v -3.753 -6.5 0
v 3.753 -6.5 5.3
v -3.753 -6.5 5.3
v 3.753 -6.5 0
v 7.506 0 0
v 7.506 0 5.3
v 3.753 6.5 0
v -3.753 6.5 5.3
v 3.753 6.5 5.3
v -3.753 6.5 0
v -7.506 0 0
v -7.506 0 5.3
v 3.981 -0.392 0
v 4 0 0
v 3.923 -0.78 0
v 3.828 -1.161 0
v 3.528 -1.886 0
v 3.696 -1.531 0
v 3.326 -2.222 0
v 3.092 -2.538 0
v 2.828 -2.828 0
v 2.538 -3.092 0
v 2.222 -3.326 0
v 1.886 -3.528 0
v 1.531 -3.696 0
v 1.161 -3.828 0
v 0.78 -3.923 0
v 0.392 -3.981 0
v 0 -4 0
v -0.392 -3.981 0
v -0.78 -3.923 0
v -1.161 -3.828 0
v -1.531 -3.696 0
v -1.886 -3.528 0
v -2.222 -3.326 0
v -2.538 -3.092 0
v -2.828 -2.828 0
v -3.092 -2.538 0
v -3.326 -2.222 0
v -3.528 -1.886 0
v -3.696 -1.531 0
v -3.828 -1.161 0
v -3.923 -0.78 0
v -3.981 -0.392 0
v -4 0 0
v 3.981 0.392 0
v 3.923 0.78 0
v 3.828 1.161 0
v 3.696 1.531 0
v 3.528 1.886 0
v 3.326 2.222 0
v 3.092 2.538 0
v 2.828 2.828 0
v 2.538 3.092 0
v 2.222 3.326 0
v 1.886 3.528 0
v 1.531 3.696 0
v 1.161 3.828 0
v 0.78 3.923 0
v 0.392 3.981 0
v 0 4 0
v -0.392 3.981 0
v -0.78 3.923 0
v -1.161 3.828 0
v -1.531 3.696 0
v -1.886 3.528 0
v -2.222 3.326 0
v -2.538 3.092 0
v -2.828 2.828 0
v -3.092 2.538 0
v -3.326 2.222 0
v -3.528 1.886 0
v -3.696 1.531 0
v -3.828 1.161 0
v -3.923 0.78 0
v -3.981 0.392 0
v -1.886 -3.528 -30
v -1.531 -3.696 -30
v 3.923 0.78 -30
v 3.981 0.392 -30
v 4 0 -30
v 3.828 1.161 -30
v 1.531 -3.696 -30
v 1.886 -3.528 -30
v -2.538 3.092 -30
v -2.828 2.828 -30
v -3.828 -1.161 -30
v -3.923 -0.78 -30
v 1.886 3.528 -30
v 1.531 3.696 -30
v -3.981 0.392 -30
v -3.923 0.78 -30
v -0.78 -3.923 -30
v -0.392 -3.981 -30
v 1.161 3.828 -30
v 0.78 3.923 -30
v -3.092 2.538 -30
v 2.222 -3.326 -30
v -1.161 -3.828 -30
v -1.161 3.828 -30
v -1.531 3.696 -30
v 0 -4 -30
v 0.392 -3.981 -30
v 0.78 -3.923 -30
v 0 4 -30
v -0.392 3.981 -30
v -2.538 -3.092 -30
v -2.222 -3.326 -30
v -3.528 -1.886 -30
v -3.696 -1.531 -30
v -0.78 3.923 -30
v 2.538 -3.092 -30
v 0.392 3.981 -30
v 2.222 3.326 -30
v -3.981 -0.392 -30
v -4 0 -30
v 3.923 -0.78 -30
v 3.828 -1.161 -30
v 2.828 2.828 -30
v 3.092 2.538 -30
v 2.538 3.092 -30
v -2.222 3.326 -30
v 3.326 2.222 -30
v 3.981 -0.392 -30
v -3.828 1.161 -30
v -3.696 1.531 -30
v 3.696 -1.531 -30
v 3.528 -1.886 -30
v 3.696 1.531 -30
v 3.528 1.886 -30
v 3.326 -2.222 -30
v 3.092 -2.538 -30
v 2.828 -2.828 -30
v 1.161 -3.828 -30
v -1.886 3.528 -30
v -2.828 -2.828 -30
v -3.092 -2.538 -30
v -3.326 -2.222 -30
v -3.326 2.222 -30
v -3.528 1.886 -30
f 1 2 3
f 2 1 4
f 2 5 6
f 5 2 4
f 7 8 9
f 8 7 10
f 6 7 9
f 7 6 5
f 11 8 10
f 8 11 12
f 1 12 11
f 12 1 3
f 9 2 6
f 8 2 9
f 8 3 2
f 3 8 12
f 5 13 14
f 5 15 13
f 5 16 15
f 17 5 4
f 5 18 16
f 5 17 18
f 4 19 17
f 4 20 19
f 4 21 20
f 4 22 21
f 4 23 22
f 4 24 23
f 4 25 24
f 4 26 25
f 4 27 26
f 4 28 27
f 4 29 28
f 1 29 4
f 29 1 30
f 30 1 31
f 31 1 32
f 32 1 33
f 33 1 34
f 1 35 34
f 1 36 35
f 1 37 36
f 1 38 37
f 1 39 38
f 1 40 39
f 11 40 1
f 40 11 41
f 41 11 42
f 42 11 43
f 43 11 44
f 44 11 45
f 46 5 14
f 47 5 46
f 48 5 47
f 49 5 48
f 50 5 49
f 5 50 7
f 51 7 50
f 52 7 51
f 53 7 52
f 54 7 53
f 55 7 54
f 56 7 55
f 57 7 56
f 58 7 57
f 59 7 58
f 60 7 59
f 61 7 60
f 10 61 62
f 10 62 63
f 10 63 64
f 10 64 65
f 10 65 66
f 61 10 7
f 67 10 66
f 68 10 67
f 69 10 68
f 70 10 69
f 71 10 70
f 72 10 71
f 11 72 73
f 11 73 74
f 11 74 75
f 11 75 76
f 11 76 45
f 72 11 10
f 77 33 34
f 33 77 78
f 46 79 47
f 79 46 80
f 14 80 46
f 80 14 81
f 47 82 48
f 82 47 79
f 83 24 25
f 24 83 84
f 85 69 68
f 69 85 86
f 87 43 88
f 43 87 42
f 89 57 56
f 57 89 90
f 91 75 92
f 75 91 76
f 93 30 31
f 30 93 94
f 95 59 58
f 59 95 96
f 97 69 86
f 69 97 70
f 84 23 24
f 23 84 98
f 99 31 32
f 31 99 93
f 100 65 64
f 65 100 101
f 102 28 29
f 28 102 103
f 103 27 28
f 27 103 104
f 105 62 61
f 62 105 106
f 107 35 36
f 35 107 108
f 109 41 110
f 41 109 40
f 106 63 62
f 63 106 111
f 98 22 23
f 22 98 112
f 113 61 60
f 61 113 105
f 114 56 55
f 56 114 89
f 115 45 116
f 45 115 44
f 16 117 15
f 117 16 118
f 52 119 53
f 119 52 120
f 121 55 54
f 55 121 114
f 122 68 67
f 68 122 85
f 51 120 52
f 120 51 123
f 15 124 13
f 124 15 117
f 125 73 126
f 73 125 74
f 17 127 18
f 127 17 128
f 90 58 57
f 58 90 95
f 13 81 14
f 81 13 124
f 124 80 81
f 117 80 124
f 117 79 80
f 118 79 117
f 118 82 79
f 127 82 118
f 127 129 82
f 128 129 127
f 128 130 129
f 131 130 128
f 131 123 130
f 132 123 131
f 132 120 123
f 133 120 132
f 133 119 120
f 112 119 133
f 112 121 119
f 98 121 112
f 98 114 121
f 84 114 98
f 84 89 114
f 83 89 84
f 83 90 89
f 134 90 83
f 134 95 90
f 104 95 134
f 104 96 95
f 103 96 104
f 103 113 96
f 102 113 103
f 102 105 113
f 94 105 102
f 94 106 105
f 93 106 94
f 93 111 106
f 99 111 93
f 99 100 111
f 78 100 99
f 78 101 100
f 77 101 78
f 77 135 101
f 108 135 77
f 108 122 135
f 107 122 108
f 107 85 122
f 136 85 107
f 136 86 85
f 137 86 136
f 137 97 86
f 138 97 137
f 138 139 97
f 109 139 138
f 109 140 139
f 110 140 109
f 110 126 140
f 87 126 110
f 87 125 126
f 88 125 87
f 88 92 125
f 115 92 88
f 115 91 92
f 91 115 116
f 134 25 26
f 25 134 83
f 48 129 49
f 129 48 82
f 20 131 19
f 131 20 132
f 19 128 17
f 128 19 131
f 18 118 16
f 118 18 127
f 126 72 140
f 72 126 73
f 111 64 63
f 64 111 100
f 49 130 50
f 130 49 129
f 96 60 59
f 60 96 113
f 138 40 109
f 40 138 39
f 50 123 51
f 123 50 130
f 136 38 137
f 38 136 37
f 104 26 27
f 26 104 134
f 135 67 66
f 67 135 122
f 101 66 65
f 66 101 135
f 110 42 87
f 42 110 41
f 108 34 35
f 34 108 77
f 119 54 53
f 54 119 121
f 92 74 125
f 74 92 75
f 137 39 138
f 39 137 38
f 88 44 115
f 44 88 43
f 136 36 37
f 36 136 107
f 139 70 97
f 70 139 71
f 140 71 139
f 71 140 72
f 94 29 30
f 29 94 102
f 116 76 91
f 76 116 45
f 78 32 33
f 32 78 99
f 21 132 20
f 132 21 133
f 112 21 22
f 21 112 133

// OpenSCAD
$fn = 64;

// M8 hex bolt (thread omitted)
// Head: hex prism, across flats = 13 mm, height = 5.3 mm
// Shank: cylinder, diameter = 8 mm, length = 30 mm
// Head bottom face at z = 0, shank extends toward negative Z

head_af = 13;
head_h = 5.3;
shank_d = 8;
shank_l = 30;

// For a regular hexagon, across-flats = sqrt(3) * circumradius
hex_r = head_af / sqrt(3);

union() {
    cylinder(h = head_h, r = hex_r, $fn = 6);
    translate([0, 0, -shank_l])
        cylinder(h = shank_l, d = shank_d);
}
